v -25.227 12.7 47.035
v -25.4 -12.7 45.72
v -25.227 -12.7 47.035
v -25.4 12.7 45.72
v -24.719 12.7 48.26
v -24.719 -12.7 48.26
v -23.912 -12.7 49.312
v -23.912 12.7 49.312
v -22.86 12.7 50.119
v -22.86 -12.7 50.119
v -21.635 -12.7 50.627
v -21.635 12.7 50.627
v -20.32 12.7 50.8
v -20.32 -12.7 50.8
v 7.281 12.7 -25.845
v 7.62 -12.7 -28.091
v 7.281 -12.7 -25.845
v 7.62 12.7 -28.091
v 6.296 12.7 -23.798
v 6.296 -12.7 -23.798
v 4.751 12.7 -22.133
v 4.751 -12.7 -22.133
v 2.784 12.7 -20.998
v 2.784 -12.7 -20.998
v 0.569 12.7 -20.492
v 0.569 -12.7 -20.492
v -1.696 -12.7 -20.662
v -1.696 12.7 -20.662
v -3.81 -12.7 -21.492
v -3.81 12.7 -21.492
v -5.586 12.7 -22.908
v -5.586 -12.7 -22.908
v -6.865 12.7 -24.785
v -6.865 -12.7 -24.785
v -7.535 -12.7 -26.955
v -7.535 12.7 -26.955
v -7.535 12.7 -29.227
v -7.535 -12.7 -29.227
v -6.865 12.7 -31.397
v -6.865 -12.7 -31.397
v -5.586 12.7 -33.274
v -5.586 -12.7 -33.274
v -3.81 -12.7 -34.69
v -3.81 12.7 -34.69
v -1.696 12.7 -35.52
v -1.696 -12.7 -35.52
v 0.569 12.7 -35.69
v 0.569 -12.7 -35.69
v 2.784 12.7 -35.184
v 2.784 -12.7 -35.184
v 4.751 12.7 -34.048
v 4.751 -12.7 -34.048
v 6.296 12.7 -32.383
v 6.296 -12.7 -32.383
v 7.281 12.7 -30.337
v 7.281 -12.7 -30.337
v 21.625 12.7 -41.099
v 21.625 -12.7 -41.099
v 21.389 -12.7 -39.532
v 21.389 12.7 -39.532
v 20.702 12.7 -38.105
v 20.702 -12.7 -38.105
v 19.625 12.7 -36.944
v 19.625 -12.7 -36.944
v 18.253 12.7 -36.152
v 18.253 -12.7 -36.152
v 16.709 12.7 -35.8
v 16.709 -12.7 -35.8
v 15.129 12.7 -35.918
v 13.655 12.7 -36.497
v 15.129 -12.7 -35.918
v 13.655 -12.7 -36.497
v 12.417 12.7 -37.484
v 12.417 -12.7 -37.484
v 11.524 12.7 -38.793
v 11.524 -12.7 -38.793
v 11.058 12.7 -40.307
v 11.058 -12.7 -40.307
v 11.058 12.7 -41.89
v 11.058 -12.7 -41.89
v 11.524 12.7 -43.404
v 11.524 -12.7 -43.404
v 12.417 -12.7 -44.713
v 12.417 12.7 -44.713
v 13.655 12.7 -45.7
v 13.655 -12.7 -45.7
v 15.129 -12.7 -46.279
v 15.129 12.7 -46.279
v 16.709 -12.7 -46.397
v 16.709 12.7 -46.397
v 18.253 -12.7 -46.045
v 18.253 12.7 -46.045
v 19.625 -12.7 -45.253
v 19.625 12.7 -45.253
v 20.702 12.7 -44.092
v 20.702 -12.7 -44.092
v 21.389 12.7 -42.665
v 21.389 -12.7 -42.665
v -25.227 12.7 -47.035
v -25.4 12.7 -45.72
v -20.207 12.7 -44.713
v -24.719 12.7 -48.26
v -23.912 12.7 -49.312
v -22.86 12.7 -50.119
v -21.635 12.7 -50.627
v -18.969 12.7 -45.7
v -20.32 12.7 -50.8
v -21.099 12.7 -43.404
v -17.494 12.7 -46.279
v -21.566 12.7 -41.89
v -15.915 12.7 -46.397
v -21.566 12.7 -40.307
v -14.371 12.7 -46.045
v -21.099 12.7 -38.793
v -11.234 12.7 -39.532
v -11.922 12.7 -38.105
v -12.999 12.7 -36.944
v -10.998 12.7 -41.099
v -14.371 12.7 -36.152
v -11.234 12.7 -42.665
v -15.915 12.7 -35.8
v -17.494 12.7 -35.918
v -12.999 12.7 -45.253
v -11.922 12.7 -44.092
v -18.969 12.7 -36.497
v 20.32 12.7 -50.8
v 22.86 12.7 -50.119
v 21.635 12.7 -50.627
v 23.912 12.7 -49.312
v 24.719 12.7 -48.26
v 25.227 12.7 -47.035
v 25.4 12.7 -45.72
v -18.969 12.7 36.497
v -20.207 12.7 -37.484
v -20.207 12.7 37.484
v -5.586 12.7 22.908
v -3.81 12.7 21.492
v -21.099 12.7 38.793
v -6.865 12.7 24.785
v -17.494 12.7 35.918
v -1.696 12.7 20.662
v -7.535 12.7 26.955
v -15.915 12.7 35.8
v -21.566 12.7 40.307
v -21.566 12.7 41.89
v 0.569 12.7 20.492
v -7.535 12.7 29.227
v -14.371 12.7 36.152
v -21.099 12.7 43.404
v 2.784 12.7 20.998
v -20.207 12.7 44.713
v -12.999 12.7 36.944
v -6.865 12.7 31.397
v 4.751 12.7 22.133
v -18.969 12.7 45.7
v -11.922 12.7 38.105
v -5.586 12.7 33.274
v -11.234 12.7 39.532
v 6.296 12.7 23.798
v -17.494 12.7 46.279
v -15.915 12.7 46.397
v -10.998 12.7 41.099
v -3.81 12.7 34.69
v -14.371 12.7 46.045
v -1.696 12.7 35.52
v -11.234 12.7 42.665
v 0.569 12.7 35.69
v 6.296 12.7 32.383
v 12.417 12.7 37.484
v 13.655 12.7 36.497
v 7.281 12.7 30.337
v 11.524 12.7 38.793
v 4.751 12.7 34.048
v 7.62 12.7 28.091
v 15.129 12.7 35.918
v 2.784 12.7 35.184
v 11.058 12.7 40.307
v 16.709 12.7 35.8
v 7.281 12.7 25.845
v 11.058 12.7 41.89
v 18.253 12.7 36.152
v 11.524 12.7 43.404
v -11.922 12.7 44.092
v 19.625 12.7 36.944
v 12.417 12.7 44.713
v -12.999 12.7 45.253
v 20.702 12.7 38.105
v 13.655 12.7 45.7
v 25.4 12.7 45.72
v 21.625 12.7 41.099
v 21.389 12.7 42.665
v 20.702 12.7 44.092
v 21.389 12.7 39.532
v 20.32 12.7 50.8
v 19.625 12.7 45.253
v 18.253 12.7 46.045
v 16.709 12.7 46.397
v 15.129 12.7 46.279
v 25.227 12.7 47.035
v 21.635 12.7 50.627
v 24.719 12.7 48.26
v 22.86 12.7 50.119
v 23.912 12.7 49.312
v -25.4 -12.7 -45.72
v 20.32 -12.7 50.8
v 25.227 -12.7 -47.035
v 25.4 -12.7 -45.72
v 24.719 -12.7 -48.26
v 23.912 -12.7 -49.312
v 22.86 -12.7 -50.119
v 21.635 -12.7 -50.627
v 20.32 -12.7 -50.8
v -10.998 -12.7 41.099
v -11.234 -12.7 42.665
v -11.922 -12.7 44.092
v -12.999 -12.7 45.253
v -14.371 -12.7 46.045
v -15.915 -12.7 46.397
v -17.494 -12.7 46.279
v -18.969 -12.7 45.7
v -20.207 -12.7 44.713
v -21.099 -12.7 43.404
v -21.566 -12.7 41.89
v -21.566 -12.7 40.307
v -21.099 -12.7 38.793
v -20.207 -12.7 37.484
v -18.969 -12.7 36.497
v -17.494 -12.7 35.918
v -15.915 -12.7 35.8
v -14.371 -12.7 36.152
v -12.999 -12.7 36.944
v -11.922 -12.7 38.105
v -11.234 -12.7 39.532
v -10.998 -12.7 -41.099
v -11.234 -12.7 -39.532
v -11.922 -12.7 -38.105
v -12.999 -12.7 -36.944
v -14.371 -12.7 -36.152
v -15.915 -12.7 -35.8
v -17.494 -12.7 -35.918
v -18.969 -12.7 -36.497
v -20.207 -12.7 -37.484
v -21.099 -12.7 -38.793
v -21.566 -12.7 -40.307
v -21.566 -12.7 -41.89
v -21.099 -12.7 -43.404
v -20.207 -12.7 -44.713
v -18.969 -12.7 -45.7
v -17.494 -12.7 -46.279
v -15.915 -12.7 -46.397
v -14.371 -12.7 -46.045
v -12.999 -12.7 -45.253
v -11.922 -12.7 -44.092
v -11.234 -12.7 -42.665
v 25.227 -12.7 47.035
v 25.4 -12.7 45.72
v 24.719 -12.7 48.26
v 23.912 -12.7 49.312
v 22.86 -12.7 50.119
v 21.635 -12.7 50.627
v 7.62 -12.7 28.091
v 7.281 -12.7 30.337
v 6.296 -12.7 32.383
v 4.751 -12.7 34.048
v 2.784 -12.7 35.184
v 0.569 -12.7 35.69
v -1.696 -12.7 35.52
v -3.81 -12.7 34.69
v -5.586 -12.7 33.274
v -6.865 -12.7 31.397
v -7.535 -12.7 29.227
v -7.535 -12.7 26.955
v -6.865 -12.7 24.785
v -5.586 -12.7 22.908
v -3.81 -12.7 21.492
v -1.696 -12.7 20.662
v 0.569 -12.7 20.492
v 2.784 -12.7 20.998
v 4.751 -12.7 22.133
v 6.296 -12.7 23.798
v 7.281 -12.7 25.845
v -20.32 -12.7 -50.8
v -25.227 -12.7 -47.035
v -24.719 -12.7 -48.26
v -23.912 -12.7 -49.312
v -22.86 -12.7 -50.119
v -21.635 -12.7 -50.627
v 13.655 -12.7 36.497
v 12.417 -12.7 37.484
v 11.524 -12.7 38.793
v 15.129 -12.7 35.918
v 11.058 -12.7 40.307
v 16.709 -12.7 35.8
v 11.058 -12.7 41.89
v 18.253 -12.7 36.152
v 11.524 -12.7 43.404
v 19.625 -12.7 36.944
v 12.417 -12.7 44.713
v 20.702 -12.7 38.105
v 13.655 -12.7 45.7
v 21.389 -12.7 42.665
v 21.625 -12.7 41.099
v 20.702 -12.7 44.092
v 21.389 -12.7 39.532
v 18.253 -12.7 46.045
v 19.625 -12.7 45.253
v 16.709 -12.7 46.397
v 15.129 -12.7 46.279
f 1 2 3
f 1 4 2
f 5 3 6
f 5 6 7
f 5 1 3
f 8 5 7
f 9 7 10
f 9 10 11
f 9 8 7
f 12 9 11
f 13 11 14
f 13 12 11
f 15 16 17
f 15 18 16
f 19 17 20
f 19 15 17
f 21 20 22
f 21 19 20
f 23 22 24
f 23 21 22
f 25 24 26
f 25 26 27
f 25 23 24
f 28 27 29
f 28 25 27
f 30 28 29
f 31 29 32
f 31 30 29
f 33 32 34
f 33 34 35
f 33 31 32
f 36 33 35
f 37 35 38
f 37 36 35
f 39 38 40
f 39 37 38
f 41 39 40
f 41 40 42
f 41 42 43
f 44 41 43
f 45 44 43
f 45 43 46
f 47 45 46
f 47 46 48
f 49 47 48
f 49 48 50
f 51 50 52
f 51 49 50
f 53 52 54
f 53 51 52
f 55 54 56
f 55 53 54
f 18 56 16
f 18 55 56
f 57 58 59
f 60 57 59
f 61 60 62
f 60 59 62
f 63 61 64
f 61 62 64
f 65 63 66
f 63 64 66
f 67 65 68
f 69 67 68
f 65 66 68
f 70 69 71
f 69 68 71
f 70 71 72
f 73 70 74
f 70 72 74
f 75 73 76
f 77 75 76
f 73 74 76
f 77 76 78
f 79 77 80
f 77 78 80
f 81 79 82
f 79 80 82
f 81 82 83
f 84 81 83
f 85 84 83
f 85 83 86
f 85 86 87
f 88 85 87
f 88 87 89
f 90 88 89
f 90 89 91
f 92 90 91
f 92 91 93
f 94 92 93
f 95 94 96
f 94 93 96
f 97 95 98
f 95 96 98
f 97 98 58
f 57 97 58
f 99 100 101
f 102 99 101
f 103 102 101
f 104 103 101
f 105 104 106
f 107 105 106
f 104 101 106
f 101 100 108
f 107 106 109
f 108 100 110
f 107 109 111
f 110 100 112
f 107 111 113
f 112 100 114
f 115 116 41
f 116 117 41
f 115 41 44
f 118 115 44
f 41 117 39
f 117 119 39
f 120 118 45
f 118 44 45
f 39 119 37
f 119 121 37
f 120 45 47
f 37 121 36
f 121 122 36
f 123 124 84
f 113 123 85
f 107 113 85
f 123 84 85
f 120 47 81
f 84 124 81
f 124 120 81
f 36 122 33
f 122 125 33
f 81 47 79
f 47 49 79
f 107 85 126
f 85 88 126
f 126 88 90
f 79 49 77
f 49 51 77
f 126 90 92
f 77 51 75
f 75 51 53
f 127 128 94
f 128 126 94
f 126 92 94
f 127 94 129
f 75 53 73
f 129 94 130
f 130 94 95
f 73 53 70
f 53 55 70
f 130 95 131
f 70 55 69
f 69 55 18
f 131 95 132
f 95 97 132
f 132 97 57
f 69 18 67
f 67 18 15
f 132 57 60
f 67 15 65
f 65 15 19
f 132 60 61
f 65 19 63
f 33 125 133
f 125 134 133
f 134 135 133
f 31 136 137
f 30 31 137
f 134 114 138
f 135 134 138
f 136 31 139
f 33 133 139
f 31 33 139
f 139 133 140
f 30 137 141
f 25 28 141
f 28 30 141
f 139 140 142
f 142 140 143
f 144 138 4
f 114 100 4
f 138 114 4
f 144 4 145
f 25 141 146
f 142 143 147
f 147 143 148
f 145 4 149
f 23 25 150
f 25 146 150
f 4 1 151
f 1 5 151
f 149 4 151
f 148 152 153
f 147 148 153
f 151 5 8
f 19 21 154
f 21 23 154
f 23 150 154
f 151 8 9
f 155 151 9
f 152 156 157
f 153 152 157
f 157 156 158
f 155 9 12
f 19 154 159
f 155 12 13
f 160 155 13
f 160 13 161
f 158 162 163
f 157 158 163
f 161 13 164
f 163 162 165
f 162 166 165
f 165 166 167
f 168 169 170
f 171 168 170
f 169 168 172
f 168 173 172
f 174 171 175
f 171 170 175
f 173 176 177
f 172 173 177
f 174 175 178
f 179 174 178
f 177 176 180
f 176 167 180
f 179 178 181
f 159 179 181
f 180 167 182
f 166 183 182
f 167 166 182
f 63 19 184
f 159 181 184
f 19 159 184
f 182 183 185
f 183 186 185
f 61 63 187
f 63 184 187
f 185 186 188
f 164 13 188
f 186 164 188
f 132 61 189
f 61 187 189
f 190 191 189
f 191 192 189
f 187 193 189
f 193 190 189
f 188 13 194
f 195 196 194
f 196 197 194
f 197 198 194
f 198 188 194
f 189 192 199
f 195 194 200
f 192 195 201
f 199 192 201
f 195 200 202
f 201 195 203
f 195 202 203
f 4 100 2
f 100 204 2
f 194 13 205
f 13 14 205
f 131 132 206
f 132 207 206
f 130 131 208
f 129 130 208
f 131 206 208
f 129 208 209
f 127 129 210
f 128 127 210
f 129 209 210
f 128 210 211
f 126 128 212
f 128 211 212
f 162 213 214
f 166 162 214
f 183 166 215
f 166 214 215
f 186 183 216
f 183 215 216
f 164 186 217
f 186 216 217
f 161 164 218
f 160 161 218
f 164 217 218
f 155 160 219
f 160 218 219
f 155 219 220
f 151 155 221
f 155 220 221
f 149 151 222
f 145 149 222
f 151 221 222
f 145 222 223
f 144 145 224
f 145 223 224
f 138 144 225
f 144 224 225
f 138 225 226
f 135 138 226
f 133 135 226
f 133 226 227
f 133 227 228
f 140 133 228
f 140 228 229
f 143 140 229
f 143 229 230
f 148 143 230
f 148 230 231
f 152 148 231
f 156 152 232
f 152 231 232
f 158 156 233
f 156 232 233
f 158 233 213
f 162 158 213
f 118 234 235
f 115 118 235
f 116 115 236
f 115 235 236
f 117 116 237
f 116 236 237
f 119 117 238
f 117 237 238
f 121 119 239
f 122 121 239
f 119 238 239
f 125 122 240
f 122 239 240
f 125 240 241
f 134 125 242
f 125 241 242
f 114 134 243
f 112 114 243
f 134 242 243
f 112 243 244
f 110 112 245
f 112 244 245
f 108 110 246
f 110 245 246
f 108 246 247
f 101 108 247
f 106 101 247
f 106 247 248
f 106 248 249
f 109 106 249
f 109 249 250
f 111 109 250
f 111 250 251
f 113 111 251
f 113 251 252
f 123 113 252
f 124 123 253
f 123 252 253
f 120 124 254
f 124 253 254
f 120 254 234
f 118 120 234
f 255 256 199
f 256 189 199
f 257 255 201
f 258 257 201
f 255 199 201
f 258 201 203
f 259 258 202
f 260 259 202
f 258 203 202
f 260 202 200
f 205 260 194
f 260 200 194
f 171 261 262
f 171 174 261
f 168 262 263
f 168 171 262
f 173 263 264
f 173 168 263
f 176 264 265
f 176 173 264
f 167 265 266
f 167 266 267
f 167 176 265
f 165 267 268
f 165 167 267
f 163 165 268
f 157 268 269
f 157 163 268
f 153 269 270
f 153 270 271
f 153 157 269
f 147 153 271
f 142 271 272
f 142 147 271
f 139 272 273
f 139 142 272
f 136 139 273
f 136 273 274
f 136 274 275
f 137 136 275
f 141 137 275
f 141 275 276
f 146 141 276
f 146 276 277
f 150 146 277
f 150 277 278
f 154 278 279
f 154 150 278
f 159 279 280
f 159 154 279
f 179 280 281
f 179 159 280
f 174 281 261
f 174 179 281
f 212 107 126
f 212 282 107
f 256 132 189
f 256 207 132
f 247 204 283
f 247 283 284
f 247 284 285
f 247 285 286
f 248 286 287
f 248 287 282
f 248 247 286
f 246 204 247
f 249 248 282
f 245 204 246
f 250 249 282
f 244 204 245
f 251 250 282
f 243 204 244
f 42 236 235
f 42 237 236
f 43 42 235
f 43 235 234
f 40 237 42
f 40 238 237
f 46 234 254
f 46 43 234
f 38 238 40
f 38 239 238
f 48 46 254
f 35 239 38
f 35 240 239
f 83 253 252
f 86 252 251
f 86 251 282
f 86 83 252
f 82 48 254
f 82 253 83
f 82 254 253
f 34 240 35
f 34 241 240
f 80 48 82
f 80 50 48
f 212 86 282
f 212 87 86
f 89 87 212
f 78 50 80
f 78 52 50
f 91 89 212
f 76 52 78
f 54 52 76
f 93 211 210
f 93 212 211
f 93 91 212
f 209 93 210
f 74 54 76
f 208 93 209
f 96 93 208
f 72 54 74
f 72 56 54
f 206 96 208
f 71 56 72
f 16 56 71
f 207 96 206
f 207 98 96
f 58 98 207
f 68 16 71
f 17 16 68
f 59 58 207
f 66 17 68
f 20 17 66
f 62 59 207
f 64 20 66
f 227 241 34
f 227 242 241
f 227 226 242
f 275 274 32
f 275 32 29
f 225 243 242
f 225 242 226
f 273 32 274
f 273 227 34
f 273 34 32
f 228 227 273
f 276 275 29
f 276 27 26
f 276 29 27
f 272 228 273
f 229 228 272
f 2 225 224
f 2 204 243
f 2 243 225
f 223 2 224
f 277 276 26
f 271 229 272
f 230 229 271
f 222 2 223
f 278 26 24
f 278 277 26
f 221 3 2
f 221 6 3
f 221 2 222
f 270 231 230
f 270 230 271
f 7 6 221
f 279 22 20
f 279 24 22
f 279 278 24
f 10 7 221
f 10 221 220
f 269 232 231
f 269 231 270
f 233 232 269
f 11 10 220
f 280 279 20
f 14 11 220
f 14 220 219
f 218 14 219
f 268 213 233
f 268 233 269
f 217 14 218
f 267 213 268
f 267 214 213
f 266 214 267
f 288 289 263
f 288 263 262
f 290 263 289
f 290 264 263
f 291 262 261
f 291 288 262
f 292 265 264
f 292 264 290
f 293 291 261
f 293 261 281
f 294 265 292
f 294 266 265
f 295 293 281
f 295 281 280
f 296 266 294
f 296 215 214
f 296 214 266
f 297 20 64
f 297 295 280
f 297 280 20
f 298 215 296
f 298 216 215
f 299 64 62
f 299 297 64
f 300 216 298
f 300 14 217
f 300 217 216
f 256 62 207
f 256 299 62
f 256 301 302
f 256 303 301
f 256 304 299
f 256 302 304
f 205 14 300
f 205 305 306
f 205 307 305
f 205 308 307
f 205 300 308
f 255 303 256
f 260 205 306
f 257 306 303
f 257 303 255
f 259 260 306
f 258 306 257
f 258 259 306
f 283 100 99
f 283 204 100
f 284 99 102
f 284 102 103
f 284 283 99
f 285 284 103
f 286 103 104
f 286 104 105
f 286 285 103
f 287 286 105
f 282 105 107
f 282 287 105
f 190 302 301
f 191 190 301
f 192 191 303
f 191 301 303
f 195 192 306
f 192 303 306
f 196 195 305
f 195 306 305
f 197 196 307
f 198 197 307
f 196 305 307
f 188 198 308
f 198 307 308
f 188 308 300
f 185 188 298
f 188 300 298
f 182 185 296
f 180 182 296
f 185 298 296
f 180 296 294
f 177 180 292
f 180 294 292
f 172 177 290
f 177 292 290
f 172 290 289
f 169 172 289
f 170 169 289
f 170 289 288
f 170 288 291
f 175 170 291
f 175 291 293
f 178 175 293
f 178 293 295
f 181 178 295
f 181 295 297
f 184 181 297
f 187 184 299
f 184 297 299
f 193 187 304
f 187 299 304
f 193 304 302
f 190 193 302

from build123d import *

# Parameters (mm, degrees)
F0_W     = 50.8
F0_H     = 101.6
F0_R     = 7.62
F1_DEPTH = 12.7
F2_R     = 5.08
F3_R     = 5.313605
F4_DEPTH = 25.4


with BuildPart() as f1:
    # F0 (on Front) → F1 (new body, symmetric)
    with BuildSketch(Plane.XZ):
        Rectangle(F0_W, F0_H)
        with Locations((0, -28.090851)):
            Circle(F0_R, mode=Mode.SUBTRACT)
        with Locations((0, 28.090851)):
            Circle(F0_R, mode=Mode.SUBTRACT)
    extrude(amount=F1_DEPTH, both=True)

    # F2
    f2_edges = [f1.edges().sort_by_distance(p)[0] for p in [
        (25.4, 0, 50.8),
        (-25.4, 0, 50.8),
        (25.4, 0, -50.8),
        (-25.4, 0, -50.8),
    ]]
    fillet(f2_edges, radius=F2_R)

    # F3 (on face) → F4 (cut, through all)
    with BuildSketch(Plane.XZ.offset(12.7)):
        with Locations((-16.311834, 41.098528)):
            Circle(F3_R)
        with Locations((16.311834, 41.098528)):
            Circle(F3_R)
        with Locations((16.311834, -41.098528)):
            Circle(F3_R)
        with Locations((-16.311834, -41.098528)):
            Circle(F3_R)
    extrude(amount=-F4_DEPTH, mode=Mode.SUBTRACT)


solid = f1.part
